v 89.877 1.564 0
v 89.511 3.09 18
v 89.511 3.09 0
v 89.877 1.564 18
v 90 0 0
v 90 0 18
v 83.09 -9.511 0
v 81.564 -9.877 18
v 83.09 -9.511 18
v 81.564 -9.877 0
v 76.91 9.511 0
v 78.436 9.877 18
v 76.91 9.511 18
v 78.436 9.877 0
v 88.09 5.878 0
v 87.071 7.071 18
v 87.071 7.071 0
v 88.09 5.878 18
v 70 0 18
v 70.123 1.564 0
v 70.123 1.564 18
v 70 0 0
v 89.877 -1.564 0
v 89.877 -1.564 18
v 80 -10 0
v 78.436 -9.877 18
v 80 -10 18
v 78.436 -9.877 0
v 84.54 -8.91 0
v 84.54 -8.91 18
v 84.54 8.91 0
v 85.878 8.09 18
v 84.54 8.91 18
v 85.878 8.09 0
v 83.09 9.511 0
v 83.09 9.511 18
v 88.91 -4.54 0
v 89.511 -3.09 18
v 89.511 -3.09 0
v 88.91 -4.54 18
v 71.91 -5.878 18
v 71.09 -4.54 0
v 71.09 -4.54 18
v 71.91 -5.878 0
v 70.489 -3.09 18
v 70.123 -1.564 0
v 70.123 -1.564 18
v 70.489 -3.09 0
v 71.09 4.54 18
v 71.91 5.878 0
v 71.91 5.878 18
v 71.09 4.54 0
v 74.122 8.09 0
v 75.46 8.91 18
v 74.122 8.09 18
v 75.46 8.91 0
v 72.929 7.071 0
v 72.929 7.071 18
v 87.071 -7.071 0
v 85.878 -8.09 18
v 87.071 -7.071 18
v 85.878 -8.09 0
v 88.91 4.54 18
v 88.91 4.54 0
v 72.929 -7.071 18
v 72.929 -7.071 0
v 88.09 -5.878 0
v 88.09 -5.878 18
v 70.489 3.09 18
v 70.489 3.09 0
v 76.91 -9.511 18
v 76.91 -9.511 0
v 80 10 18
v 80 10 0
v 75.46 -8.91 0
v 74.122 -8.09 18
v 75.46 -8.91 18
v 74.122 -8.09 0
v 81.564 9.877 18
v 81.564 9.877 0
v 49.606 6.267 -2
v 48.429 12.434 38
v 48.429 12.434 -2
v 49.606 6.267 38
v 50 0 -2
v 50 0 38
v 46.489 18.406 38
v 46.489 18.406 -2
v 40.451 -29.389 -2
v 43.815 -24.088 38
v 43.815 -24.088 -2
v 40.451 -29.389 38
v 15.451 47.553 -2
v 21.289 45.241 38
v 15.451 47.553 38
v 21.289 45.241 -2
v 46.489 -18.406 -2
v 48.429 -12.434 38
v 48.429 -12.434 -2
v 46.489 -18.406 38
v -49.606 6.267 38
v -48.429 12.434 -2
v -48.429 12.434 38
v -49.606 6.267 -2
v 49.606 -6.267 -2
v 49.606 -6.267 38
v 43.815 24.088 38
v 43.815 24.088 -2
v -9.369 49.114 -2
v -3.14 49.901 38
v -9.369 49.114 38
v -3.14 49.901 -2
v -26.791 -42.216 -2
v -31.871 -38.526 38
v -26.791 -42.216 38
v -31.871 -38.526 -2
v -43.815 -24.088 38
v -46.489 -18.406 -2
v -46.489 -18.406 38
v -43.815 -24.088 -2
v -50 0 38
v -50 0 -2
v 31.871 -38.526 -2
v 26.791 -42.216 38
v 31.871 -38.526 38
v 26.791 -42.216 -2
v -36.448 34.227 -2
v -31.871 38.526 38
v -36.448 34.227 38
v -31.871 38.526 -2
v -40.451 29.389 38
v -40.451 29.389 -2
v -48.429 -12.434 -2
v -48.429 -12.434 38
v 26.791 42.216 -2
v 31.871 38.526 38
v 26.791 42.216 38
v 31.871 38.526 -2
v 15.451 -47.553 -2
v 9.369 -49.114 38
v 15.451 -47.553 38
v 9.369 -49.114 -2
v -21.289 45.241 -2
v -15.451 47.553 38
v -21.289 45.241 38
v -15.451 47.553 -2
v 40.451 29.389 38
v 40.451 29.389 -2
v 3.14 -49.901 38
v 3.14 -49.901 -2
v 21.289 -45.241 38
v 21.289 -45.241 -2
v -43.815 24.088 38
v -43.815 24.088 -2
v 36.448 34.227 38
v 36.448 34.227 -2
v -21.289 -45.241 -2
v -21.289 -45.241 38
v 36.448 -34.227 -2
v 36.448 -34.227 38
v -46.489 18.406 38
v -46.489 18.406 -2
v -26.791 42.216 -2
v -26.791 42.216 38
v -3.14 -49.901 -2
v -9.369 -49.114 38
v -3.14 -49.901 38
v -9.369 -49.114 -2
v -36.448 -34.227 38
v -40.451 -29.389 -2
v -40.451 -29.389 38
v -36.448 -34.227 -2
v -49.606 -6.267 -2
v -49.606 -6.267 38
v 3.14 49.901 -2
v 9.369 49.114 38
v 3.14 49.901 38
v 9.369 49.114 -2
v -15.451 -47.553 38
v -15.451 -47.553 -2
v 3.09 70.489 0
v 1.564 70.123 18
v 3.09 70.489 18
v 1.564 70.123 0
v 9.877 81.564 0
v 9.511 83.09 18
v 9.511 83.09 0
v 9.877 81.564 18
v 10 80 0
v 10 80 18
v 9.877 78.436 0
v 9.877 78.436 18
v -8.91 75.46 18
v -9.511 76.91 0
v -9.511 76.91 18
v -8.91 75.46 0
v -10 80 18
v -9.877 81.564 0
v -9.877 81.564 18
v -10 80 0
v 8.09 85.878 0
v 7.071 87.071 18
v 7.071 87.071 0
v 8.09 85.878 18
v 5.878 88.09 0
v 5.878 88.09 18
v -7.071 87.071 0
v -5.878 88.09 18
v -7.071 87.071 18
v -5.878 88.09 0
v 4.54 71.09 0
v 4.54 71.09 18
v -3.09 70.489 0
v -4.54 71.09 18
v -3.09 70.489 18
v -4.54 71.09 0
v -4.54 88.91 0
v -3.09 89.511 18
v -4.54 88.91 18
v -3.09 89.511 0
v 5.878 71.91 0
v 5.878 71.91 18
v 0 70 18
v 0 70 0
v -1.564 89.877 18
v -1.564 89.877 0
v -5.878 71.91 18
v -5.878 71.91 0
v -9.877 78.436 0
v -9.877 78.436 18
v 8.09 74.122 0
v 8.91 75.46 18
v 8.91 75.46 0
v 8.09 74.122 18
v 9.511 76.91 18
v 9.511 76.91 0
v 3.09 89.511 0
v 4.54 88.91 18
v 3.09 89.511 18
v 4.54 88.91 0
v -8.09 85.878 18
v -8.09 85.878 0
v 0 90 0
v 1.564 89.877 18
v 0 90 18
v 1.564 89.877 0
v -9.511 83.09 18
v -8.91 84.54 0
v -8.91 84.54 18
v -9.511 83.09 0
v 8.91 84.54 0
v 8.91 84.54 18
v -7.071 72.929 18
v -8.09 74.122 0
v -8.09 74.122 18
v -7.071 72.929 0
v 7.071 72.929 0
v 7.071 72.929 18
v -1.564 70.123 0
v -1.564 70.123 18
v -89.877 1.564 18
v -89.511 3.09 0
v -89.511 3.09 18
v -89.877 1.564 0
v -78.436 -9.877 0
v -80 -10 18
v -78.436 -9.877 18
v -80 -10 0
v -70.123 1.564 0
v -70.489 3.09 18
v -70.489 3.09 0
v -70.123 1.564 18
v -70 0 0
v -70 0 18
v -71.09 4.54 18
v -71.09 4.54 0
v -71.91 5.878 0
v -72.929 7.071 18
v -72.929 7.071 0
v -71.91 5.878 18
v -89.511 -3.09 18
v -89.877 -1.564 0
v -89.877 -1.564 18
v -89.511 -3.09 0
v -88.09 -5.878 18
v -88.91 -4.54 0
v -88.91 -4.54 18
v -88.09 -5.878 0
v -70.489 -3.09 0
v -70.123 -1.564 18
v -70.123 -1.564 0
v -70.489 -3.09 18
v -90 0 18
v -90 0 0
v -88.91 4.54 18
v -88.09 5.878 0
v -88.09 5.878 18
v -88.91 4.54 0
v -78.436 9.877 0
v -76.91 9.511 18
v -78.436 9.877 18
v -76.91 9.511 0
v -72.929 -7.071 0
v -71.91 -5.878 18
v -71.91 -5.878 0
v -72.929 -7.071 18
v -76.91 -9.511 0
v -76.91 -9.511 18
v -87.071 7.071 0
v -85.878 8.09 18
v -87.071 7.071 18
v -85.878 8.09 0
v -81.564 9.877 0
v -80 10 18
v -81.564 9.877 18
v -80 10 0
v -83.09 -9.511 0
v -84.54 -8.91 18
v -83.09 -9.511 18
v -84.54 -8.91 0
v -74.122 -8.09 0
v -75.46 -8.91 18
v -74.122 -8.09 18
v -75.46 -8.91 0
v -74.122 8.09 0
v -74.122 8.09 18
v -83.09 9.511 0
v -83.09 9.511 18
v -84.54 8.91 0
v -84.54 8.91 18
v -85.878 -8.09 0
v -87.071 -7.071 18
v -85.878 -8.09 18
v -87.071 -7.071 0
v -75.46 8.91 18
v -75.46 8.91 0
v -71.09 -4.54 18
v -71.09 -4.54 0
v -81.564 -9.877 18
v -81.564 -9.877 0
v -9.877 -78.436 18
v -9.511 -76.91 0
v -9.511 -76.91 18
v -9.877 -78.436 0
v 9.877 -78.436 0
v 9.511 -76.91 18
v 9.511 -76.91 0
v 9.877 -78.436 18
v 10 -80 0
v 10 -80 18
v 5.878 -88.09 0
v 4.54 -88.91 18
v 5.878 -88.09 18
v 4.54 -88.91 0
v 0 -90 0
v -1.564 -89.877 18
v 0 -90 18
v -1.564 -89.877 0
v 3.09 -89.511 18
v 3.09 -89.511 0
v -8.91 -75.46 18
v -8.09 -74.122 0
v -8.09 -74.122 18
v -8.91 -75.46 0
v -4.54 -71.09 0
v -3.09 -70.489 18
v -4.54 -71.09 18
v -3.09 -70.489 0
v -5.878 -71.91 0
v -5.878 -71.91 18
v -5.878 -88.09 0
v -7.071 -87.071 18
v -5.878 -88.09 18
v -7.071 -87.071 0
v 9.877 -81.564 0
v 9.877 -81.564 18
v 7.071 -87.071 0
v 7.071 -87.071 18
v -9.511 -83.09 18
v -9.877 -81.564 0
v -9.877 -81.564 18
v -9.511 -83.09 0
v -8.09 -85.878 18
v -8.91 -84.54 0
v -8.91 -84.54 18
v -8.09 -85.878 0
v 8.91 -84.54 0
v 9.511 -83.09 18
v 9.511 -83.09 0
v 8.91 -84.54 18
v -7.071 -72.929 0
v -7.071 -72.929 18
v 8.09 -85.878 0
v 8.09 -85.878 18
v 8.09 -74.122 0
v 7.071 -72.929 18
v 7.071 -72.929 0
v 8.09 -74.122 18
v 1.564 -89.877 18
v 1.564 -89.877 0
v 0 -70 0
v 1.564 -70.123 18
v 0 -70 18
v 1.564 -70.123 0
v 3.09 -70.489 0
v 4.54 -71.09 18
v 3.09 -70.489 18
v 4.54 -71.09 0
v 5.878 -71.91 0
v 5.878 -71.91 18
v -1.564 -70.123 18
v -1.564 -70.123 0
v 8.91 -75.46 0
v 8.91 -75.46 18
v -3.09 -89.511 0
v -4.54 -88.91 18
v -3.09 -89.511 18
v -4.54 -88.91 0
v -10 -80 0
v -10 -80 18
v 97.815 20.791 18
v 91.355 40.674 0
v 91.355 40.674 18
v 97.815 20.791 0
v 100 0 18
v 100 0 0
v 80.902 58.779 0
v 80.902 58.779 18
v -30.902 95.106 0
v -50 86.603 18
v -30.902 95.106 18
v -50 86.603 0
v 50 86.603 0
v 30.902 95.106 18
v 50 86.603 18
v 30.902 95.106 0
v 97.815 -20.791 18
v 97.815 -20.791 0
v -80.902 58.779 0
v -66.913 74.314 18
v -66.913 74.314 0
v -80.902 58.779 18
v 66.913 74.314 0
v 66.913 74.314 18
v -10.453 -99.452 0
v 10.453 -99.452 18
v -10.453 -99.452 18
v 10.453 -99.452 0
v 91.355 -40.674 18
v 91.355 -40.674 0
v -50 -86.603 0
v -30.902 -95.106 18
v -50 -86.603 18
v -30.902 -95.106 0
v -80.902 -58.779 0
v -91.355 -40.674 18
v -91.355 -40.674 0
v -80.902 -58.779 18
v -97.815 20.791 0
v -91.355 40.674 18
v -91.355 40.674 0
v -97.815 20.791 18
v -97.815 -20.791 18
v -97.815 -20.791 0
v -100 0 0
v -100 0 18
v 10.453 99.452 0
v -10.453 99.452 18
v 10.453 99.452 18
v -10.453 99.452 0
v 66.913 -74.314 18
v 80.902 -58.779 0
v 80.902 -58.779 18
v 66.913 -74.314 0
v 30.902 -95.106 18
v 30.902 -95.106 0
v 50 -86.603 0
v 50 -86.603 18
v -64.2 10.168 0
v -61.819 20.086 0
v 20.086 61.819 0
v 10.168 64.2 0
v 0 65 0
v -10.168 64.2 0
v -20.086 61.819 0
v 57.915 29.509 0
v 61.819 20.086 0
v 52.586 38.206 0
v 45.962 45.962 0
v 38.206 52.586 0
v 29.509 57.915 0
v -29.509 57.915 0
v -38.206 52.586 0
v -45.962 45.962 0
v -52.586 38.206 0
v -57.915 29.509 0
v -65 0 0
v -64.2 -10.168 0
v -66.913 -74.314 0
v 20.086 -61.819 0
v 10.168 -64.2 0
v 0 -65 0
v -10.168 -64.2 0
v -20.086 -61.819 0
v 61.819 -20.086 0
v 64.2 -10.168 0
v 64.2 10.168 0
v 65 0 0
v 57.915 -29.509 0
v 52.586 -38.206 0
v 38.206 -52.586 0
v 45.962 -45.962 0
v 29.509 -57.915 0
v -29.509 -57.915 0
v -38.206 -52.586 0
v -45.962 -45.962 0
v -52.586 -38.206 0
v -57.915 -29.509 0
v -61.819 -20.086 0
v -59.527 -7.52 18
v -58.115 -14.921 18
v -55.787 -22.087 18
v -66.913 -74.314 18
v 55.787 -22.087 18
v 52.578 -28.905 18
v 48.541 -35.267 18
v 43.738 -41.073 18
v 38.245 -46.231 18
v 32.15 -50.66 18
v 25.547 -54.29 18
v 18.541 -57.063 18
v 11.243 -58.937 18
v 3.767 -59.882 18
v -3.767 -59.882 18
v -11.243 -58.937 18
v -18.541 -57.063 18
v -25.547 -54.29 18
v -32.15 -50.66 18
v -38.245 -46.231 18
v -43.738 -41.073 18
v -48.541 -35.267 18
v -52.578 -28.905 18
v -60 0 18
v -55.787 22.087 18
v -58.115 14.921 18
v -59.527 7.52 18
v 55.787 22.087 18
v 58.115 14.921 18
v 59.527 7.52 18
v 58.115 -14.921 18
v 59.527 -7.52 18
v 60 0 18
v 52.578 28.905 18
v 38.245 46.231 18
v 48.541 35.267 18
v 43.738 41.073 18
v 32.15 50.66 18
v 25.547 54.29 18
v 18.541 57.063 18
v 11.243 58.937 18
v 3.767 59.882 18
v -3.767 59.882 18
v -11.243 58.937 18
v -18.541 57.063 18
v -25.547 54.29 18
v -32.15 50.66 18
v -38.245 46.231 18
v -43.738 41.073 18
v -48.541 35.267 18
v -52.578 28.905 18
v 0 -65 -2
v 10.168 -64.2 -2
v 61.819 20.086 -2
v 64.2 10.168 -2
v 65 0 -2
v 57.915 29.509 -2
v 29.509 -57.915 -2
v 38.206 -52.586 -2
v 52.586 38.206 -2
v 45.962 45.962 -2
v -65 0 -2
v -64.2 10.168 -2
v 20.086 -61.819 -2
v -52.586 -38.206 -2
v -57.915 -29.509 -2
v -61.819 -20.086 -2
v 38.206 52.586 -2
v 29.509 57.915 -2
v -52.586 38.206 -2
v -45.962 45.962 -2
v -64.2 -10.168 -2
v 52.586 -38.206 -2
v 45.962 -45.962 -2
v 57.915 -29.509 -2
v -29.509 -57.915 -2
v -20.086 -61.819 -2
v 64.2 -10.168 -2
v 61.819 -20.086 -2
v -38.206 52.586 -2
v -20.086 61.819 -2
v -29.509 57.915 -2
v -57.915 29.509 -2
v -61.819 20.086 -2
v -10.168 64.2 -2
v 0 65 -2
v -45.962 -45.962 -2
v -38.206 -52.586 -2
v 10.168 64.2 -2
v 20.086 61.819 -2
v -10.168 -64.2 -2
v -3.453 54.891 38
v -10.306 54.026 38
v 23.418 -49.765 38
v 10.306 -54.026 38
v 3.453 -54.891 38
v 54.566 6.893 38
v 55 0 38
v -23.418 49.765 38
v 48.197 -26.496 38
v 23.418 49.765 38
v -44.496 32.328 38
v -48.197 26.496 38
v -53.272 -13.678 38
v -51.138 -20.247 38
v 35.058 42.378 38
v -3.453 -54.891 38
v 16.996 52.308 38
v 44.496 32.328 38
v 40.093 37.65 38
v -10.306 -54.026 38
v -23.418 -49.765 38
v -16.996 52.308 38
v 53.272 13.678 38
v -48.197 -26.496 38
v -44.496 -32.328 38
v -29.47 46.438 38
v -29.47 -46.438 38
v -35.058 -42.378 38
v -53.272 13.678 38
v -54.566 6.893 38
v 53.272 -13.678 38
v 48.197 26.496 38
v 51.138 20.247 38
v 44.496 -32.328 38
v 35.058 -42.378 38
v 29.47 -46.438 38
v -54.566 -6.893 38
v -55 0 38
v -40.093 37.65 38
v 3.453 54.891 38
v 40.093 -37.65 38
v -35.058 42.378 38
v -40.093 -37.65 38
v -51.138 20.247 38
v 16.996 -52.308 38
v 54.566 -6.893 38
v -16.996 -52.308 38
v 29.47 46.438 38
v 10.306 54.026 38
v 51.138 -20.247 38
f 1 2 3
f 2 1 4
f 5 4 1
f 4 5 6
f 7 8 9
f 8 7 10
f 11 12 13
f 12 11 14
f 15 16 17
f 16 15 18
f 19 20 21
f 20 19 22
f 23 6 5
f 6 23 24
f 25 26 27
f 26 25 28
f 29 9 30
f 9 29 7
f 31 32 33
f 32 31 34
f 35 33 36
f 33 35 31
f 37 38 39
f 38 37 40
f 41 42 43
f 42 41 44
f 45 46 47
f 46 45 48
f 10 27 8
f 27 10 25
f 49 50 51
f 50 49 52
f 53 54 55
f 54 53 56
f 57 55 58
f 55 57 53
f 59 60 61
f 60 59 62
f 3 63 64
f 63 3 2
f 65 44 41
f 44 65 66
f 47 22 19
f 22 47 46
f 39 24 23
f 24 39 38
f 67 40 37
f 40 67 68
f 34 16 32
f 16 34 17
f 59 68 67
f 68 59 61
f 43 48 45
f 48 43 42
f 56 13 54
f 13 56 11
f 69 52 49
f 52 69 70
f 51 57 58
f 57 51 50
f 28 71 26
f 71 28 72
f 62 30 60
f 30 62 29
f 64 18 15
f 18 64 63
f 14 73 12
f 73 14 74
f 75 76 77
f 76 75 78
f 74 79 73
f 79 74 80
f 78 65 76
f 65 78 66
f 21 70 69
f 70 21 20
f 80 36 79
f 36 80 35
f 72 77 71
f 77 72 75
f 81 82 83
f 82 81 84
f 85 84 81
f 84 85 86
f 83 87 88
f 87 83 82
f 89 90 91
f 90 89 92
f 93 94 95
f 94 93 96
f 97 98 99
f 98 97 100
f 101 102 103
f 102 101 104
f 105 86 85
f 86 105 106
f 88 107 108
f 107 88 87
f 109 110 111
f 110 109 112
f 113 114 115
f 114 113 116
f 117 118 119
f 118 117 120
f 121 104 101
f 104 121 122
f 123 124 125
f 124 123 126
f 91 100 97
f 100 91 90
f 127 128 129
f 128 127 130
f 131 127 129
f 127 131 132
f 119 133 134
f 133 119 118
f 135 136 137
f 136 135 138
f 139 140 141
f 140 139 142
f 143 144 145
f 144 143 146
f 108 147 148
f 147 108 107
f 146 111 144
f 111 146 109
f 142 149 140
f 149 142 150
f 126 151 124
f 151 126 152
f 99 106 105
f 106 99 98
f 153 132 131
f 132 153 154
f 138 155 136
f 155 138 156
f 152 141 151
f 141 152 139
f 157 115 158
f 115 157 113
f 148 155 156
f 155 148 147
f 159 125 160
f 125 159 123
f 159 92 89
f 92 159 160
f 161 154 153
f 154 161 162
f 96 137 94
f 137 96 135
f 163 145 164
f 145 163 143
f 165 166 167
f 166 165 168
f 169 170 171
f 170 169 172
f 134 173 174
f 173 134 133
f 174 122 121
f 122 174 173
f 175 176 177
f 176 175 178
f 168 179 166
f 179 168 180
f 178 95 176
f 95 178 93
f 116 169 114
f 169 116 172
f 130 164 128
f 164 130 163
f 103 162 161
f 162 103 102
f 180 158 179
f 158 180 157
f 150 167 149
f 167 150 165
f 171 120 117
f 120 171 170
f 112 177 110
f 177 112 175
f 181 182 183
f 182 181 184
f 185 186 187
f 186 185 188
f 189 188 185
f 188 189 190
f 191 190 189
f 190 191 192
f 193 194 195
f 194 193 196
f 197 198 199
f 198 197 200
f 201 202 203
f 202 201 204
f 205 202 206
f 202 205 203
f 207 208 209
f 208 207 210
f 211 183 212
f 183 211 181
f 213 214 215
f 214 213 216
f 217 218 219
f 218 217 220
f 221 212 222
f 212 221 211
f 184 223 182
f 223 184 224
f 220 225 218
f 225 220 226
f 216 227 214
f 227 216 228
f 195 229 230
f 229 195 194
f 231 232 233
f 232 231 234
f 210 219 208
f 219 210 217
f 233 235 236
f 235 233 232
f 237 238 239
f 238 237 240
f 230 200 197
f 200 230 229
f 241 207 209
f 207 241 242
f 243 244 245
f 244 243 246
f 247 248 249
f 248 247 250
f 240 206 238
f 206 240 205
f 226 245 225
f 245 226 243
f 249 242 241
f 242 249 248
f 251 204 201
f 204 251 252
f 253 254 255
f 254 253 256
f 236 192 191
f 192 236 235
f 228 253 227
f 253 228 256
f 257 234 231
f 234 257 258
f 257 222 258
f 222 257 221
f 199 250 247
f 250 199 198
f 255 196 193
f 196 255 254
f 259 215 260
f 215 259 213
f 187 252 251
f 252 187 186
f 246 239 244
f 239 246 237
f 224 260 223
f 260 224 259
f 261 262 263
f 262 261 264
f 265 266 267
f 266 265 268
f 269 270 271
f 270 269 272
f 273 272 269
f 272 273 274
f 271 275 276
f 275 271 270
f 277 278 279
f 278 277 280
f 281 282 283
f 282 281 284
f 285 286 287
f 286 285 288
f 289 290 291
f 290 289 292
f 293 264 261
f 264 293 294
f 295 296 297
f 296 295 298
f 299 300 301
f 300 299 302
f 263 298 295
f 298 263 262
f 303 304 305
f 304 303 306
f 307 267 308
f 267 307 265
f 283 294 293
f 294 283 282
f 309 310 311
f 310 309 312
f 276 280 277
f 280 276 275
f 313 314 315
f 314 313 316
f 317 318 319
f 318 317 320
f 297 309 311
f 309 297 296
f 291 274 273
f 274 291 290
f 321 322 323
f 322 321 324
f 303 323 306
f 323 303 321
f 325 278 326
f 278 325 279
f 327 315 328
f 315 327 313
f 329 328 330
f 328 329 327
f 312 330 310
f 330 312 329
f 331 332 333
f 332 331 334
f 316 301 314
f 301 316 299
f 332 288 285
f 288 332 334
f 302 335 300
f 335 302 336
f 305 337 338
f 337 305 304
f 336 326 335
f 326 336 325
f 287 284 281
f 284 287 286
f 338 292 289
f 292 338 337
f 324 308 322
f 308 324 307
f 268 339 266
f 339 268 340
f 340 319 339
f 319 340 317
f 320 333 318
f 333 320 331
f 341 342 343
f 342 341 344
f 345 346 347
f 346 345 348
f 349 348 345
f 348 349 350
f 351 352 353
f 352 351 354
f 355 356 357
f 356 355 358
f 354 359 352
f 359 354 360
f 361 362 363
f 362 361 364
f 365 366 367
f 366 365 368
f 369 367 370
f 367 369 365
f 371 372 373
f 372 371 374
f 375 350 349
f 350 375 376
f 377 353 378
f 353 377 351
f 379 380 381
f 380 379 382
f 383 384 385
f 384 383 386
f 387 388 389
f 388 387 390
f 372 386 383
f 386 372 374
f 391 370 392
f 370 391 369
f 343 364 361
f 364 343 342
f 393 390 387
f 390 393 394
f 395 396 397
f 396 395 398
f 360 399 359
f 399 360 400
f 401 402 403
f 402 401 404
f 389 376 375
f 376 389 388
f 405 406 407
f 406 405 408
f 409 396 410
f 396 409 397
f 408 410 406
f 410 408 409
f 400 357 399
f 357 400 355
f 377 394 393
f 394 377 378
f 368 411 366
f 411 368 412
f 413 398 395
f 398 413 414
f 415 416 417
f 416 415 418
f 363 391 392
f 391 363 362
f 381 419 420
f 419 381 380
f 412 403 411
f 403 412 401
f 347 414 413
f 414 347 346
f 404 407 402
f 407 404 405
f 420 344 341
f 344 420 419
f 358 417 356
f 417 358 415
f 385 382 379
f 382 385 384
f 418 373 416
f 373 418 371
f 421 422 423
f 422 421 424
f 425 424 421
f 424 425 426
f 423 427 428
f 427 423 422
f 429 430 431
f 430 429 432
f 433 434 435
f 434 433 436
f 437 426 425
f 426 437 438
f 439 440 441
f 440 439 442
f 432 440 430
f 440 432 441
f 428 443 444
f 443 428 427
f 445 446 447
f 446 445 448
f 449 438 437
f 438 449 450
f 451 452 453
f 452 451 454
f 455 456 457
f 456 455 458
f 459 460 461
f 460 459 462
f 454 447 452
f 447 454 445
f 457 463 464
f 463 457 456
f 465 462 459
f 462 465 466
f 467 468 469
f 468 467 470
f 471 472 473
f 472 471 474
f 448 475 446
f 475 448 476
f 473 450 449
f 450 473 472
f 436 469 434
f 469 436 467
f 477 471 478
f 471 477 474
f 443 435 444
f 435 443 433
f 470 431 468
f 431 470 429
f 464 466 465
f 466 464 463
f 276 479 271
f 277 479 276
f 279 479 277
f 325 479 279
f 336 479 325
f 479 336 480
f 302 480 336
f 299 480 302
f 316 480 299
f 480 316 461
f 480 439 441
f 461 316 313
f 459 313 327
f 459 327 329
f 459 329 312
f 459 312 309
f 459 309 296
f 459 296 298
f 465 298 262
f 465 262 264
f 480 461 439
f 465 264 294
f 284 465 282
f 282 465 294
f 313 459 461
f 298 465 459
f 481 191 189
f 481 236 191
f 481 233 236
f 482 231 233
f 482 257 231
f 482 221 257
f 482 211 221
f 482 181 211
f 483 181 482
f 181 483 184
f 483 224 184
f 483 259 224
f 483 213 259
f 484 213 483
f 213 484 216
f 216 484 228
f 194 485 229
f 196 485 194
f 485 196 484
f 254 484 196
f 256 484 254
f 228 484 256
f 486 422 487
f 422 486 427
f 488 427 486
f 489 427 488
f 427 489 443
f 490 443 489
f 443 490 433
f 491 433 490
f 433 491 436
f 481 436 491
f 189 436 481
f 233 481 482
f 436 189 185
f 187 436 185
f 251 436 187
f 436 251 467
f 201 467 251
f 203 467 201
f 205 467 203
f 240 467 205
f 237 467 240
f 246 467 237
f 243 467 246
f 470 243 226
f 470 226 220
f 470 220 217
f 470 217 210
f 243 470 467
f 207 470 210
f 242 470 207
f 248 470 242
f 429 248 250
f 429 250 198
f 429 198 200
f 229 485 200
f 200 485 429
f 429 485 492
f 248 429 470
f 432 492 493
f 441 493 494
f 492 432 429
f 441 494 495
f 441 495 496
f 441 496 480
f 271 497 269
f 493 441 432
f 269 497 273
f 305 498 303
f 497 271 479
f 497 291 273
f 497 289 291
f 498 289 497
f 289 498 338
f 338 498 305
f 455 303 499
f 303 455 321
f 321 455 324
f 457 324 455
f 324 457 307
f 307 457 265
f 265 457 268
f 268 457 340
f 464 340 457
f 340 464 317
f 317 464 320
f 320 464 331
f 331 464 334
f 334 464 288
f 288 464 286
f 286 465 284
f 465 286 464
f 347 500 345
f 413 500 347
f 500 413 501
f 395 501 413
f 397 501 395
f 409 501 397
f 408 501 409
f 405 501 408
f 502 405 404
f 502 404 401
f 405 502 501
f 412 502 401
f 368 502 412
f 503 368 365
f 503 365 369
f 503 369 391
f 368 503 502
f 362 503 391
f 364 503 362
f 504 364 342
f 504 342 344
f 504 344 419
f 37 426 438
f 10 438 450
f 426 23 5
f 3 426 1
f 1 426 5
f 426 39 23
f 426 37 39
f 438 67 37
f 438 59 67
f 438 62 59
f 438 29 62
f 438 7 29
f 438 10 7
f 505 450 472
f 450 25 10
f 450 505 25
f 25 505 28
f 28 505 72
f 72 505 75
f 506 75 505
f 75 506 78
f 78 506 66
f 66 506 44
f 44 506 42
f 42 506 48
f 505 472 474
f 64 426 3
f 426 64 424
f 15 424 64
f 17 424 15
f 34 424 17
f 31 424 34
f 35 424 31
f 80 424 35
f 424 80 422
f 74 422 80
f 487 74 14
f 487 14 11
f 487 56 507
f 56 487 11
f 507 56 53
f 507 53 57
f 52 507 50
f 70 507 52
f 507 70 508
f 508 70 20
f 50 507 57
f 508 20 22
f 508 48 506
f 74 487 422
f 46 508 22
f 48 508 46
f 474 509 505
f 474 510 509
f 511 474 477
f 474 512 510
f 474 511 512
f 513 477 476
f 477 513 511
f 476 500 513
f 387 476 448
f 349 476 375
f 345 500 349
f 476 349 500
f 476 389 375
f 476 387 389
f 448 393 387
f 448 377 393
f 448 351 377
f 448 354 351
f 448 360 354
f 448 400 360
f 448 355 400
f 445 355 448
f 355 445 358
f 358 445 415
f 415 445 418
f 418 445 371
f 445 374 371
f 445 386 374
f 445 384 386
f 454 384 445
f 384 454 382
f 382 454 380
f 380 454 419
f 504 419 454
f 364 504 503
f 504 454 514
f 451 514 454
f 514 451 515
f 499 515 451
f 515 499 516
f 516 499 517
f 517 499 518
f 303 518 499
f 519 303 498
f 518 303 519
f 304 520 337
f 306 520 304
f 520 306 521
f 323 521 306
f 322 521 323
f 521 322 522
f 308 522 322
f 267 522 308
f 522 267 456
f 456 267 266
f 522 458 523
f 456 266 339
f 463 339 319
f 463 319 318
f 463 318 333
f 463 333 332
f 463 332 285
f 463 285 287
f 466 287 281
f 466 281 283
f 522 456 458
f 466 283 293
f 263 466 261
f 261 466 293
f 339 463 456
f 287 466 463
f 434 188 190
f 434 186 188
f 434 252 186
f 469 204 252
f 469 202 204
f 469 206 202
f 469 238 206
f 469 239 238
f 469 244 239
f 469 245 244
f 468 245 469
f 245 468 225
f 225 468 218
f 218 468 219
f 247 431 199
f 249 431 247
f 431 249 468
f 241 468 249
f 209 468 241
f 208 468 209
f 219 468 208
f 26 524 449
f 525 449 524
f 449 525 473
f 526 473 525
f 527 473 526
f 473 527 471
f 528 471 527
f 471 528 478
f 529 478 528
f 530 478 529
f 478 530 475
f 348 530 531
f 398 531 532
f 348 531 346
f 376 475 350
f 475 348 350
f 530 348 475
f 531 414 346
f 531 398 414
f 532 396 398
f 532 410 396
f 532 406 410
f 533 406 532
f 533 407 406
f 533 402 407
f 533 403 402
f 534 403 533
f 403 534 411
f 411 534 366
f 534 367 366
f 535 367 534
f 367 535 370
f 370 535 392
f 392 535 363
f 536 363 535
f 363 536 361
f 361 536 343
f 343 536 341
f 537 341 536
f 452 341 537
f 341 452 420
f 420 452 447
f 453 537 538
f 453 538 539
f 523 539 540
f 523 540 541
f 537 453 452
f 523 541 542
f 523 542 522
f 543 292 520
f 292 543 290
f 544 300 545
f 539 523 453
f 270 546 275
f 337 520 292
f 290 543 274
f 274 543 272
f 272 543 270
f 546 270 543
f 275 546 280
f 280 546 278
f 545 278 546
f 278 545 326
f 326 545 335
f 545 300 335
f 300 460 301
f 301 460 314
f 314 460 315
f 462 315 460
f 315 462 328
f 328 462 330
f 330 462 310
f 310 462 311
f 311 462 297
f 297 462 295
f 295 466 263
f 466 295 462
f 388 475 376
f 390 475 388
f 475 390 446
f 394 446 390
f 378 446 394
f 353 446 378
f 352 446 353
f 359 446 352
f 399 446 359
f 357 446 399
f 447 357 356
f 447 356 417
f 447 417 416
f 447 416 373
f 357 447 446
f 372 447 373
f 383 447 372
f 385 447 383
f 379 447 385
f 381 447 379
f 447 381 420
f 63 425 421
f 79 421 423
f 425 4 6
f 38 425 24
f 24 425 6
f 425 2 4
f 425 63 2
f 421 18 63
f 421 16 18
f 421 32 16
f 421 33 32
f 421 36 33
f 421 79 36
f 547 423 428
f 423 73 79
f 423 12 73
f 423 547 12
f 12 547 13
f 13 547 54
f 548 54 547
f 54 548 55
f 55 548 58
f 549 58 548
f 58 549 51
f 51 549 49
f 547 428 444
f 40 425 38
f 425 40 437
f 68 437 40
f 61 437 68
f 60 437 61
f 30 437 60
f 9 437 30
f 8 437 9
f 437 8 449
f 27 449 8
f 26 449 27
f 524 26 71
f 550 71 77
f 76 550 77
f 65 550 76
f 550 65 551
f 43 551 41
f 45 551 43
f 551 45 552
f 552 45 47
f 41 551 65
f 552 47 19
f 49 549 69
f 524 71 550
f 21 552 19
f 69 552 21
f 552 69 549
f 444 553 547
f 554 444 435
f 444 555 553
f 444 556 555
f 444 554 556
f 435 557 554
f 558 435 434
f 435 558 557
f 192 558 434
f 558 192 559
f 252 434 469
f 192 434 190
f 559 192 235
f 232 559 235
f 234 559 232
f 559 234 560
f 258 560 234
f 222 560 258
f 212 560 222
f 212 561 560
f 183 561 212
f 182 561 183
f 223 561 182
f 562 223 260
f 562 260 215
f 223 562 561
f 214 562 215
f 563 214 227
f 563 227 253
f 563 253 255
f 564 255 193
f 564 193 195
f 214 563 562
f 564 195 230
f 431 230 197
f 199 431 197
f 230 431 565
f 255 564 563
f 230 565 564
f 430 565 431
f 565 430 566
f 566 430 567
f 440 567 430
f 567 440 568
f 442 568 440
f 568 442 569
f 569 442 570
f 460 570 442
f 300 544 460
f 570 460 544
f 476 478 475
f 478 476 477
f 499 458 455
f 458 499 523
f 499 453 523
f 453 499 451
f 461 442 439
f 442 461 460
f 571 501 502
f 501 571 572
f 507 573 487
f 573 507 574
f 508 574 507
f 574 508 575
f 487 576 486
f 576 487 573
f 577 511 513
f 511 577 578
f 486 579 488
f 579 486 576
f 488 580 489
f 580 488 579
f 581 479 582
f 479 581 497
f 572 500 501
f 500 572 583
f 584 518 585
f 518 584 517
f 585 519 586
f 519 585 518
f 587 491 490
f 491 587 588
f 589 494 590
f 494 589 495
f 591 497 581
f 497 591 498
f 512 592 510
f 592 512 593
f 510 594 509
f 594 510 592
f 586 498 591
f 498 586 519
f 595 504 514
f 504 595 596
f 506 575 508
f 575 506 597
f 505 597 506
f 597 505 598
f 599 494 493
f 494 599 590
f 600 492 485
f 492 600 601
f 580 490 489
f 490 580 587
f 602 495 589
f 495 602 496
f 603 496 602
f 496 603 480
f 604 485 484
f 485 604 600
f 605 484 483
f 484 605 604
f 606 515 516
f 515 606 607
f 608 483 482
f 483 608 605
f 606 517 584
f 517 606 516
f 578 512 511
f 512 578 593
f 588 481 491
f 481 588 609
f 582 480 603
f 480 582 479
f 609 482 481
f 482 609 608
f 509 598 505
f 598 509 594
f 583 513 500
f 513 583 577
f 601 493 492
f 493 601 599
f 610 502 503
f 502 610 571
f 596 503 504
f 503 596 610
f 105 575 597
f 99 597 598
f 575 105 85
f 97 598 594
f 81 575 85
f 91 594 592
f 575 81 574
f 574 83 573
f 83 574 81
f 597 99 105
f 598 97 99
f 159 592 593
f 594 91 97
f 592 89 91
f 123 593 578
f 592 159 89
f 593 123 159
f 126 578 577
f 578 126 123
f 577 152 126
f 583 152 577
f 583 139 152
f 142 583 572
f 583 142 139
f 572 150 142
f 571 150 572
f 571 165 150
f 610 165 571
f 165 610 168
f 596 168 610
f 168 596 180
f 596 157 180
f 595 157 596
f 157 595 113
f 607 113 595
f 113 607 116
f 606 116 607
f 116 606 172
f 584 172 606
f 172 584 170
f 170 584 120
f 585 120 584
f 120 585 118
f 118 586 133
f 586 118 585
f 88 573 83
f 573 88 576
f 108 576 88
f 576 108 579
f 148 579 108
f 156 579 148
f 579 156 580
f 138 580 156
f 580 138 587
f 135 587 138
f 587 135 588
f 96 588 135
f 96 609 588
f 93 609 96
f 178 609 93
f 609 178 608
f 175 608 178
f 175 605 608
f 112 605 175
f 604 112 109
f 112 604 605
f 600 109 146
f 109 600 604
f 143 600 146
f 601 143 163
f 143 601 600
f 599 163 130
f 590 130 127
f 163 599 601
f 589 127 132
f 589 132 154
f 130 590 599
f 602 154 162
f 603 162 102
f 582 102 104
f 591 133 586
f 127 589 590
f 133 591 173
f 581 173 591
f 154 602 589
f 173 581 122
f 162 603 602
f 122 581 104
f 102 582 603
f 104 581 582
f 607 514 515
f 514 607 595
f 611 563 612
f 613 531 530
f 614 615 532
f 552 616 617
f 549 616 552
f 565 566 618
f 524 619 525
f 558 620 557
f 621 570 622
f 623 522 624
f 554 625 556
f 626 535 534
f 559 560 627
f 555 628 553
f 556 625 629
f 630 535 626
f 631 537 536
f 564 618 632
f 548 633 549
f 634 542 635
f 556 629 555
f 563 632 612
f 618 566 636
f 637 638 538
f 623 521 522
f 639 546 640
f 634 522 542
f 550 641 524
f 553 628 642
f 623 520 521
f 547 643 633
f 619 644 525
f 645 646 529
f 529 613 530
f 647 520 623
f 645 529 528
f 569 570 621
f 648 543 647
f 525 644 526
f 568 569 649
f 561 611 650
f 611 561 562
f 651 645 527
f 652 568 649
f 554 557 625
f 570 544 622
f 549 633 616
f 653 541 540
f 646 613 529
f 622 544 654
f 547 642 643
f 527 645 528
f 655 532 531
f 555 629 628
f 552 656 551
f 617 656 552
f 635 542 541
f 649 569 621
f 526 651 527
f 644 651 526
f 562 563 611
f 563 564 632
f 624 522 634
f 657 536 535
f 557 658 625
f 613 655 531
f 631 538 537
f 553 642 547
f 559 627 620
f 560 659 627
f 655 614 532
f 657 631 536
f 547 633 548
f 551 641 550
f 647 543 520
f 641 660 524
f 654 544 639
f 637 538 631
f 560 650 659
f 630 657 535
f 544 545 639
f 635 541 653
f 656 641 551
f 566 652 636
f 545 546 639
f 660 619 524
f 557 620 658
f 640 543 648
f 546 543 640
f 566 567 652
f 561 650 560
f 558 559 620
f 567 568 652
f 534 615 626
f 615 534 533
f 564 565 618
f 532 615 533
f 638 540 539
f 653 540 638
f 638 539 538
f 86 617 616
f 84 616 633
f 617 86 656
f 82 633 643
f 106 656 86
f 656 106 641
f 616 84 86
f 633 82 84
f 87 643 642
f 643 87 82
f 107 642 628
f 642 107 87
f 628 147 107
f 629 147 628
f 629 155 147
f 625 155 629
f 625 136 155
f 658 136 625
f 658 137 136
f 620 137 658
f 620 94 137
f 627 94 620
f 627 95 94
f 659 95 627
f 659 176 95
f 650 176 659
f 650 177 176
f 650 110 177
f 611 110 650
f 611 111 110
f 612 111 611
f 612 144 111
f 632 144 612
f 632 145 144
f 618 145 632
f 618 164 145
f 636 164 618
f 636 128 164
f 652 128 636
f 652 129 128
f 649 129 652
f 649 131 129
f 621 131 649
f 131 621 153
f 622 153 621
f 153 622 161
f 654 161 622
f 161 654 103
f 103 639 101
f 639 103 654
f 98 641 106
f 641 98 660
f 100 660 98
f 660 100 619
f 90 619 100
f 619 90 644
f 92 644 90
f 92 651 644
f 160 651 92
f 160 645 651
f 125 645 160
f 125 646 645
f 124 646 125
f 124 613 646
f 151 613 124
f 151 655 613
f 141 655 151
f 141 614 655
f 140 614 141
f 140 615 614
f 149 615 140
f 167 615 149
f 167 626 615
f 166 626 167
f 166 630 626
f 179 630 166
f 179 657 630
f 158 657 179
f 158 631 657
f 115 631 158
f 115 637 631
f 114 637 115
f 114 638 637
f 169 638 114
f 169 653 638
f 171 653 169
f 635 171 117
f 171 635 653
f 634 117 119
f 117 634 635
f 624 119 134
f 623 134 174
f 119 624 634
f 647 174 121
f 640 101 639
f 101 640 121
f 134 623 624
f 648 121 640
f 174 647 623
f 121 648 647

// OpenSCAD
module Flange_03(){

    Flange_Height = 18;
    Total_Height = 38;
    Step_Height = 2;
    Hole_Diameter = 10; 
    Hole_Center_Distance = 100;

    color("#c0c6c7"){
        difference(){
      
            union(){
                translate([0,0,- Step_Height]){ 
                cylinder(Step_Height,65,65,$fn=40);
                }

                difference(){
                    cylinder(Flange_Height,100,100,$fn=30);
                    
                    r = 80;
                    // Flange Holes
                    for (i=[0:90:359]) {
                        translate([r*cos(i),r*sin(i),-1])
                        cylinder(Flange_Height+2,10,10,$fn=40);
                     
                        translate([0,0,-1]) 
                        cylinder(12,50,50,$fn=50);  
                     }
                 }         
           translate([0,0,Flange_Height]) 
            cylinder(Total_Height - Flange_Height,60,55,$fn=50);    
            }    
            translate([0,0,-10]) 
            cylinder(100,50,50,$fn=50);
        }
    }
}

Flange_03();

// Written by Nicolì Angelo (Gengio) 2024: 
// MIT License

//Permission is hereby granted, free of charge, to any person obtaining a copy of this software and associated documentation files (the "Software"), to deal in the Software without restriction, including without limitation the rights to use, copy, modify, merge, publish, distribute, sublicense, and/or sell copies of the Software, and to permit persons to whom the Software is furnished to do so, subject to the following conditions:

//The above copyright notice and this permission notice shall be included in all copies or substantial portions of the Software.

//THE SOFTWARE IS PROVIDED "AS IS", WITHOUT WARRANTY OF ANY KIND, EXPRESS OR IMPLIED, INCLUDING BUT NOT LIMITED TO THE WARRANTIES OF MERCHANTABILITY, FITNESS FOR A PARTICULAR PURPOSE AND NONINFRINGEMENT. IN NO EVENT SHALL THE AUTHORS OR COPYRIGHT HOLDERS BE LIABLE FOR ANY CLAIM, DAMAGES OR OTHER LIABILITY, WHETHER IN AN ACTION OF CONTRACT, TORT OR OTHERWISE, ARISING FROM, OUT OF OR IN CONNECTION WITH THE SOFTWARE OR THE USE OR OTHER DEALINGS IN THE SOFTWARE.
